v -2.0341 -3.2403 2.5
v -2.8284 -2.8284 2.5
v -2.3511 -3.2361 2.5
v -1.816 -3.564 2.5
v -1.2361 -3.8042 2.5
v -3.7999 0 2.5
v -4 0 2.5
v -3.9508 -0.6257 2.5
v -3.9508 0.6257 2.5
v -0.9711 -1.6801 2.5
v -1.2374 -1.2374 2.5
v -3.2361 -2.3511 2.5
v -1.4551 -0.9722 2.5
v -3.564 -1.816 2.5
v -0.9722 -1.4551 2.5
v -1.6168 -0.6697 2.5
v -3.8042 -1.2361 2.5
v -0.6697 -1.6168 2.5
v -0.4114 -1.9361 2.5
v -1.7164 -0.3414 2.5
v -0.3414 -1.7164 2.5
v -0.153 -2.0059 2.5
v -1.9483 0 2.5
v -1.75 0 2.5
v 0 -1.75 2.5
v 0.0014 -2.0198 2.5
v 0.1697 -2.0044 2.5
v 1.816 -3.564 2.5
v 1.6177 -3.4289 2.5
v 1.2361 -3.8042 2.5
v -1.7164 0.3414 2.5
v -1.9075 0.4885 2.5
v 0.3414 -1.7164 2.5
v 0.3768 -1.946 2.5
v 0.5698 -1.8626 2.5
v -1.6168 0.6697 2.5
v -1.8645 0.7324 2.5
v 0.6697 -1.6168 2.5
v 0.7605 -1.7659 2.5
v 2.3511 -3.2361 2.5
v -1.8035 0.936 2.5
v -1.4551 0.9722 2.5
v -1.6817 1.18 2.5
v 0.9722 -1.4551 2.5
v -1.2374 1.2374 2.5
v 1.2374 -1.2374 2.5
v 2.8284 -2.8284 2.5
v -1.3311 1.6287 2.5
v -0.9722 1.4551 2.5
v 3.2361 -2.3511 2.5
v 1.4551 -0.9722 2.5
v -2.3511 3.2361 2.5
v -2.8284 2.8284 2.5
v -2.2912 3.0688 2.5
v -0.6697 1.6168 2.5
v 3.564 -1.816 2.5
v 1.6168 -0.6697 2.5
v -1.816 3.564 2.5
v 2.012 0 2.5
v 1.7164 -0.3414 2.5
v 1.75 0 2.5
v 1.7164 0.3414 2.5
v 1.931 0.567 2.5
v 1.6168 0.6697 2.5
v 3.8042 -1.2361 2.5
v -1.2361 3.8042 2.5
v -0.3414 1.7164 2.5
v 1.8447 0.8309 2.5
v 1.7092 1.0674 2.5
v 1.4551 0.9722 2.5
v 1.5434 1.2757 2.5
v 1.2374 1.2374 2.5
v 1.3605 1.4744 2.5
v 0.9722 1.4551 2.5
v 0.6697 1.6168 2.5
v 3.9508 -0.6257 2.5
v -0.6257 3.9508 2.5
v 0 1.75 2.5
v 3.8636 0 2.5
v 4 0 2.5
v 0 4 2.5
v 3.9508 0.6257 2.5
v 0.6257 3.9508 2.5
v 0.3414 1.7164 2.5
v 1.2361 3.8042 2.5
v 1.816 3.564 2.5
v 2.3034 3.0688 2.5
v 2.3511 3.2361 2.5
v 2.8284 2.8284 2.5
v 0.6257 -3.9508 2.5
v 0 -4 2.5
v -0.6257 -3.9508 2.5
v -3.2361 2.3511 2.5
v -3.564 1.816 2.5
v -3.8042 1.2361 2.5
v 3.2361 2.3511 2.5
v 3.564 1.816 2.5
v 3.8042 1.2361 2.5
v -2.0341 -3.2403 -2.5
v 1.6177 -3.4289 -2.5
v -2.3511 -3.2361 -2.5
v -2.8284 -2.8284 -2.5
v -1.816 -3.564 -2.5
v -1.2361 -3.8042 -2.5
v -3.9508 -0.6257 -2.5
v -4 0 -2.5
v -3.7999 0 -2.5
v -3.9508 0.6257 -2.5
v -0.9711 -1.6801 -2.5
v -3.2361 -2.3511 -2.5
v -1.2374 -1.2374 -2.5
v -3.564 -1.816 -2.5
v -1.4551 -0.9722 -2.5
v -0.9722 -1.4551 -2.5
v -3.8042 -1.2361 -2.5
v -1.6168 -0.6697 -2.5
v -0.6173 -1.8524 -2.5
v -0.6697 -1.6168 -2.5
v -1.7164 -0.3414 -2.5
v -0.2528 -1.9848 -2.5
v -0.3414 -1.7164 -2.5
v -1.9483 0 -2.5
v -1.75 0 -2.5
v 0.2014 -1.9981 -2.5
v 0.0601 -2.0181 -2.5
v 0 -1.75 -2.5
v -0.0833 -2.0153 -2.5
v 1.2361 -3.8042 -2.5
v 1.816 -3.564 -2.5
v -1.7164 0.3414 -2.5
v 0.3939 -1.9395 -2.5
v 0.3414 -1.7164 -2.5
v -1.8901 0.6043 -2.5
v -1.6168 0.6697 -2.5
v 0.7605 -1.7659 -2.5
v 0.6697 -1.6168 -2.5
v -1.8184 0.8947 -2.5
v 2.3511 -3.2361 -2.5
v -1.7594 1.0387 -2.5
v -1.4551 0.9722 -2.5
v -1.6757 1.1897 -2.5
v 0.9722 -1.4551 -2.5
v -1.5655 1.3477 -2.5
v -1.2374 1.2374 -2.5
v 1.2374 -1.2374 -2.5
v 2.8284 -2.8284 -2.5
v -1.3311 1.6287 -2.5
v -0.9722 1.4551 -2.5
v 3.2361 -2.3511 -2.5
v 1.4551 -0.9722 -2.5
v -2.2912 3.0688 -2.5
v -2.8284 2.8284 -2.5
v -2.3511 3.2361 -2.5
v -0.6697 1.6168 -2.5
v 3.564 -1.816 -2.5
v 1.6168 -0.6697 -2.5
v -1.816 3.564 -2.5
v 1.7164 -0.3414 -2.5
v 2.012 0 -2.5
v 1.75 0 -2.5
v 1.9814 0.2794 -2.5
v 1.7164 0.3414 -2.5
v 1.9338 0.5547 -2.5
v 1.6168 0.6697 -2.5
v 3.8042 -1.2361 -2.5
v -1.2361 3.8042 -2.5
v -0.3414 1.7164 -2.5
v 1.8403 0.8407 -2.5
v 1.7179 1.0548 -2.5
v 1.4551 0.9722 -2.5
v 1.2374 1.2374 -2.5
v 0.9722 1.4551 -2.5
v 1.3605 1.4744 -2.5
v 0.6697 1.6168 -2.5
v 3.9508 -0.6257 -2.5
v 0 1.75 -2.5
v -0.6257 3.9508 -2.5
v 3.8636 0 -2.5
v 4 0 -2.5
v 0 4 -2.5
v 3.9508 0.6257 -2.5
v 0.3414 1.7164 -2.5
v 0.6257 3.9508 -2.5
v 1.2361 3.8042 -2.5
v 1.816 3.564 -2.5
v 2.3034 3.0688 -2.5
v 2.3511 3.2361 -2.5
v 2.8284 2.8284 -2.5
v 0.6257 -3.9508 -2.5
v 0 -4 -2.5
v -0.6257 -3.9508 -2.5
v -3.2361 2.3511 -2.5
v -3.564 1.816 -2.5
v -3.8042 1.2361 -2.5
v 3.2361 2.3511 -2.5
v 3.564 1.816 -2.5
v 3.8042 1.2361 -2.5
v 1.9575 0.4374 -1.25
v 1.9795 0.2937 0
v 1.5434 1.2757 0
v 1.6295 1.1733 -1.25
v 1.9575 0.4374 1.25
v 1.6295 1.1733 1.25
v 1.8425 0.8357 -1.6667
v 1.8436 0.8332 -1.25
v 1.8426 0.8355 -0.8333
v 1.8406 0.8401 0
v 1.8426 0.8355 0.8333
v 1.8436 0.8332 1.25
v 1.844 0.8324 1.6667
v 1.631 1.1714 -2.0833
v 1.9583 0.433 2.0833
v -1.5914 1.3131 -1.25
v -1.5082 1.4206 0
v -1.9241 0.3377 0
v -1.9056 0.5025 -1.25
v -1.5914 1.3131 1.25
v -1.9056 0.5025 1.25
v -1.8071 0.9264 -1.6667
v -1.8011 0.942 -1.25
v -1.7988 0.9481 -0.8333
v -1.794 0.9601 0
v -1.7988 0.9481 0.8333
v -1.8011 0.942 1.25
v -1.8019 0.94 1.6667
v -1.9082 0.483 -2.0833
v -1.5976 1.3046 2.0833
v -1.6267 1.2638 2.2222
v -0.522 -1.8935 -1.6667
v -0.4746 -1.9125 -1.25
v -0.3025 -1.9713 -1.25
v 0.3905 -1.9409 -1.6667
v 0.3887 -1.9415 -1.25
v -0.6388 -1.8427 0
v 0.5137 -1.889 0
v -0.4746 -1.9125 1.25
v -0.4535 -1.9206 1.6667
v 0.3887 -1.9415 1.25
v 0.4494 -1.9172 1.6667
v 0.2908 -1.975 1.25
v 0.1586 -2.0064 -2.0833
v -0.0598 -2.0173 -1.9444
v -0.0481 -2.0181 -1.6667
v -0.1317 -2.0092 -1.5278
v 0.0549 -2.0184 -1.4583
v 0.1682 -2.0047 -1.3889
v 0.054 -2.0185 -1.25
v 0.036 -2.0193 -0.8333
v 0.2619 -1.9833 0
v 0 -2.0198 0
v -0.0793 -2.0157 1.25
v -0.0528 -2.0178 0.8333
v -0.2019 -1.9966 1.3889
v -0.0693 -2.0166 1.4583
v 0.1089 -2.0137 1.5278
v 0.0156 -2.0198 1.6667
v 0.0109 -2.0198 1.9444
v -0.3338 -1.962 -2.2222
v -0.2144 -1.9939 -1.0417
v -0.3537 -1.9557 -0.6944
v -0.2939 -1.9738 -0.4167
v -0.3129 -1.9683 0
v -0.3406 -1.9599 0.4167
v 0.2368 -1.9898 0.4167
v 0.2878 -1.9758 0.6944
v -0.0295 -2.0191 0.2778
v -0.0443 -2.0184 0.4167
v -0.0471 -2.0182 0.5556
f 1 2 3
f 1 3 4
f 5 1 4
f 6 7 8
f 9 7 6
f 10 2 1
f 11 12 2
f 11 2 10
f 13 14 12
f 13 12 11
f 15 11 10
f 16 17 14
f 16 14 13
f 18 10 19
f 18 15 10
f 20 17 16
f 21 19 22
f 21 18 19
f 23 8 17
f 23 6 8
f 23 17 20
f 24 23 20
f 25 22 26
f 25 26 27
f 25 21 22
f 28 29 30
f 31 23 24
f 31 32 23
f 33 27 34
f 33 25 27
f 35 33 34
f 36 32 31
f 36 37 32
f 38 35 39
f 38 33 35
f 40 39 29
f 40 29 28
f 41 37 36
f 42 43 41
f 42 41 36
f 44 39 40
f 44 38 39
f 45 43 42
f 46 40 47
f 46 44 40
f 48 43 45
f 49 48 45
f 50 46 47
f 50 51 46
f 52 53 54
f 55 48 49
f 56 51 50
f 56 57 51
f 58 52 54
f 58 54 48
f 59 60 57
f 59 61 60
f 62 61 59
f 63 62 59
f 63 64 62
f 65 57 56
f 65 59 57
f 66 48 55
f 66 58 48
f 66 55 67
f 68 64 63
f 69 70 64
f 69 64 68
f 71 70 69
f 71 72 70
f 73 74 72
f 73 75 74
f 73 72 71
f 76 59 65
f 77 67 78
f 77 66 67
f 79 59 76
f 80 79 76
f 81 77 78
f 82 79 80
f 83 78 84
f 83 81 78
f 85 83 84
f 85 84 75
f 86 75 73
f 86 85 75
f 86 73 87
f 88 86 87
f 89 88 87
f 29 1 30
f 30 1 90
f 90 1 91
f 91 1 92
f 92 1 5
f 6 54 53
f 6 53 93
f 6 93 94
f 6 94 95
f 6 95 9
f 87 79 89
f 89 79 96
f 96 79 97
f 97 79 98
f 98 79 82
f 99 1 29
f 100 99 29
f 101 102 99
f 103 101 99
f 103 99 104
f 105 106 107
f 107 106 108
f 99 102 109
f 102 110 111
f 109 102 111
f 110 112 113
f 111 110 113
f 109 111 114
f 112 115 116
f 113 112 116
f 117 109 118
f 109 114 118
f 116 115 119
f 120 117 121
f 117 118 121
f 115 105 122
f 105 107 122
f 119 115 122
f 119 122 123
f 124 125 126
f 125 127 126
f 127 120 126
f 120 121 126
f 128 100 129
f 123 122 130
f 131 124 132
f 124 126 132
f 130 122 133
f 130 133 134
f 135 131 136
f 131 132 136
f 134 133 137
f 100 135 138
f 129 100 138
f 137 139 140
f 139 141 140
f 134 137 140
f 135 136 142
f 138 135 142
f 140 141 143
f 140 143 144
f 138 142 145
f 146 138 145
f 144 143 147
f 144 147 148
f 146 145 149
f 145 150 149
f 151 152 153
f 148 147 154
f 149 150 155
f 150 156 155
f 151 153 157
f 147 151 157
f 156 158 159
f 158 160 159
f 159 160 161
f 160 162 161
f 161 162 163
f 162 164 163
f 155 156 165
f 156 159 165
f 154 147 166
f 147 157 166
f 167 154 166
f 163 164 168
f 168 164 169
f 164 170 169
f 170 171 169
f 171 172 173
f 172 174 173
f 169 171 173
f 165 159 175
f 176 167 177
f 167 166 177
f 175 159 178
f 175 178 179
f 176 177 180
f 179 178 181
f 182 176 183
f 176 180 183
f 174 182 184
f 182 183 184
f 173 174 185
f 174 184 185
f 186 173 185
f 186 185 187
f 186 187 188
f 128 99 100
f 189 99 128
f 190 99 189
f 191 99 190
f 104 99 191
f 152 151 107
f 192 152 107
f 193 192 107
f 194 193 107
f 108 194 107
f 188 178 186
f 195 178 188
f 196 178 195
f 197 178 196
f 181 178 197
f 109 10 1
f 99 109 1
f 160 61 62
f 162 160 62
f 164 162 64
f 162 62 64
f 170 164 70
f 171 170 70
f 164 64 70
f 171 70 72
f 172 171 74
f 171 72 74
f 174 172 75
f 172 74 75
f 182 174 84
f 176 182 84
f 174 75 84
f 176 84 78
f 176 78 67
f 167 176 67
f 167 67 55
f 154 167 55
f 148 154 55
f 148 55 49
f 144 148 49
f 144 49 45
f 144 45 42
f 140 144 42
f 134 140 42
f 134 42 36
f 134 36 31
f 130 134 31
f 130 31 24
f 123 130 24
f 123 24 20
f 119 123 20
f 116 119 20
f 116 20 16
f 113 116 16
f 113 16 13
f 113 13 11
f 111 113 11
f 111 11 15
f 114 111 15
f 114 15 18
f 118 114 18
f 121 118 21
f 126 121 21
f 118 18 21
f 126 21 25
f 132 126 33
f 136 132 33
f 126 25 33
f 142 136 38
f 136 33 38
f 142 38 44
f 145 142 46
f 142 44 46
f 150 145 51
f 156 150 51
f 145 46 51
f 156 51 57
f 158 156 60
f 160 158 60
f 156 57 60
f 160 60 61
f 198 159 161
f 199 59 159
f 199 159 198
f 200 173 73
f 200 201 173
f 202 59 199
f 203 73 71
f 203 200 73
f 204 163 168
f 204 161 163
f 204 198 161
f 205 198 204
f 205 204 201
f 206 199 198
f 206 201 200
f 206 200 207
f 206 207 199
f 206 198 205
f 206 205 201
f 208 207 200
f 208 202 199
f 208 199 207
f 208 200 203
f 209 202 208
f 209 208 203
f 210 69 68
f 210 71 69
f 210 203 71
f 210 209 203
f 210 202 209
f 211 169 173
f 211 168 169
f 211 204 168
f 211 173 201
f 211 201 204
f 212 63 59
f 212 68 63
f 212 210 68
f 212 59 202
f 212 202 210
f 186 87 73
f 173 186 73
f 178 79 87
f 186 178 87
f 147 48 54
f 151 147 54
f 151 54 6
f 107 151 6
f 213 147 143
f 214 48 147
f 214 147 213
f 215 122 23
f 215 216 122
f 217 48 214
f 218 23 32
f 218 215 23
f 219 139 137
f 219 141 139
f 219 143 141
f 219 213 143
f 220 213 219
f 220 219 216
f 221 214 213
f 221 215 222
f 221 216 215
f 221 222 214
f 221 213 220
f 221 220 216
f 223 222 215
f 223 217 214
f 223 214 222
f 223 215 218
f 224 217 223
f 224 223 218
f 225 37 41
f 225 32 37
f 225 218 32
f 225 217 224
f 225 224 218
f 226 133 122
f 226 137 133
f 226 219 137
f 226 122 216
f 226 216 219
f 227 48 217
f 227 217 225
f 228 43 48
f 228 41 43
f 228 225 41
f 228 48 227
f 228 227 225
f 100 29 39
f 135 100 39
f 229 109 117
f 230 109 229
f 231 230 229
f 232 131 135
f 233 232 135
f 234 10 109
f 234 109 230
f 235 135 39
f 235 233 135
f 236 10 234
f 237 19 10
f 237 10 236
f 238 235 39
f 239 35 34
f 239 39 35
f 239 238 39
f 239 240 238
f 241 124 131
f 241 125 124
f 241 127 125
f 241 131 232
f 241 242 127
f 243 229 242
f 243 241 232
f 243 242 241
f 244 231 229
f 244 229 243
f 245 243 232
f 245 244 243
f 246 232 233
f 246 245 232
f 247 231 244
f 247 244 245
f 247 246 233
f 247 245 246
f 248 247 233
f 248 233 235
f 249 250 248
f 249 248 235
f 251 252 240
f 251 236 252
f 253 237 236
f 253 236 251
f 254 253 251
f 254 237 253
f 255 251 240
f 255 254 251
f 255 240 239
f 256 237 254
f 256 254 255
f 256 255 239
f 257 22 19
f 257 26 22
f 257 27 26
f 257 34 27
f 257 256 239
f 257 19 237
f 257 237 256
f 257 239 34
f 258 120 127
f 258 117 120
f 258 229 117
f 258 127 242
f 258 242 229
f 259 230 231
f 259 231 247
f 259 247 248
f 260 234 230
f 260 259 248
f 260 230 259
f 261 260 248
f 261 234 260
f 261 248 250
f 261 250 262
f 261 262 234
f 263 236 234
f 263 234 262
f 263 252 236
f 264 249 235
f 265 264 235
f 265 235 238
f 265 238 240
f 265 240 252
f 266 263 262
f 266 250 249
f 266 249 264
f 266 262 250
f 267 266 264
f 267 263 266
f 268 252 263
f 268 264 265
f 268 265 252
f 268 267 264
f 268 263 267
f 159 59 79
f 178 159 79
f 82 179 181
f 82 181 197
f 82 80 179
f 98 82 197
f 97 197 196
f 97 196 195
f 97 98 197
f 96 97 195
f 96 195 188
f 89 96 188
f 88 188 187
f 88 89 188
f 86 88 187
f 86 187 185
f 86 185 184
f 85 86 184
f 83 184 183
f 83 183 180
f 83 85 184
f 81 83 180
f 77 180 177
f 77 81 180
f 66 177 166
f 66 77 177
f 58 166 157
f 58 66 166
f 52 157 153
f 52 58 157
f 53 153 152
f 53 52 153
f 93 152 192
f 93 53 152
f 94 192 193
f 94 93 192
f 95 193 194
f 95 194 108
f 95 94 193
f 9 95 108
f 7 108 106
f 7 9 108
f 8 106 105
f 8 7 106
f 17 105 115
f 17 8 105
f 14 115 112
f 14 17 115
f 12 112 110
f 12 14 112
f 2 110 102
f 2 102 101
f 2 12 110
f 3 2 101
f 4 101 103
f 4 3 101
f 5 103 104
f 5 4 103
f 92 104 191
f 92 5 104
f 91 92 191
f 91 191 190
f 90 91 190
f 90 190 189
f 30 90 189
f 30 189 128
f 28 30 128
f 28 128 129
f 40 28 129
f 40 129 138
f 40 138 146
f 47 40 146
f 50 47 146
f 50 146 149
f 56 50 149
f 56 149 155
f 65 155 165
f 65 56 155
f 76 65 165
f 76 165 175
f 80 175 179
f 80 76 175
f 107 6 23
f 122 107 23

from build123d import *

# Parameters (mm, degrees)
F0_R     = 4
F1_DEPTH = 2.5
F2_R     = 1.75
F3_DEPTH = 11.3
F6_DEPTH = 8.5


with BuildPart() as f1:
    # F0 (on Top) → F1 (new body, symmetric)
    with BuildSketch(Plane.XY):
        Circle(F0_R)
    extrude(amount=F1_DEPTH, both=True)

    # F2 (on face) → F3 (cut)
    with BuildSketch(Plane.XY.offset(2.5)):
        Circle(F2_R)
    extrude(amount=-F3_DEPTH, mode=Mode.SUBTRACT)

    # F5 (on face) → F6 (cut)
    with BuildSketch(Plane.XY.offset(2.5)):
        with BuildLine():
            add(Edge.make_bspline(
                [(2.0119966939, 0), (1.9826024943, 0.2954333995), (1.924894753, 0.8754387886), (1.5462774399, 1.2772605749), (1.360513852, 1.4744091313)],
                knots=[0, 0, 0, 0, 0.5093631973, 1, 1, 1, 1], degree=3))
            Line((2.0119966939, 0), (3.8635805249, 0))
            Line((3.8635805249, 0), (2.3034499027, 3.0688282568))
            Line((2.3034499027, 3.0688282568), (1.360513852, 1.4744091313))
        make_face()
        with BuildLine():
            Line((-3.7999181077, 0), (-2.1026332397, 0))
            Line((-2.1026332397, 0), (-1.9483346259, 0))
            add(Edge.make_bspline(
                [(-1.3311400544, 1.6287077451), (-1.5110569531, 1.4224997977), (-1.8877122283, 0.9908043222), (-1.9275343397, 0.3399570839), (-1.9483346259, 0)],
                knots=[0, 0, 0, 0, 0.4776699295, 1, 1, 1, 1], degree=3))
            Line((-1.3311400544, 1.6287077451), (-2.2912204731, 3.0688282568))
            Line((-2.2912204731, 3.0688282568), (-3.7999181077, 0))
        make_face()
        with BuildLine():
            Line((-0.9711100138, -1.6801406164), (-2.0340562332, -3.2402712386))
            Line((-2.0340562332, -3.2402712386), (1.6176782083, -3.428858472))
            Line((1.6176782083, -3.428858472), (0.7604635903, -1.7658622237))
            add(Edge.make_bspline(
                [(-0.9711100138, -1.6801406164), (-0.637698637, -1.848903582), (-0.0099582222, -2.1666471906), (0.514541214, -1.8937947275), (0.7604635903, -1.7658622237)],
                knots=[0, 0, 0, 0, 0.5311293792, 1, 1, 1, 1], degree=3))
        make_face()
    extrude(amount=-F6_DEPTH, mode=Mode.SUBTRACT)


solid = f1.part
